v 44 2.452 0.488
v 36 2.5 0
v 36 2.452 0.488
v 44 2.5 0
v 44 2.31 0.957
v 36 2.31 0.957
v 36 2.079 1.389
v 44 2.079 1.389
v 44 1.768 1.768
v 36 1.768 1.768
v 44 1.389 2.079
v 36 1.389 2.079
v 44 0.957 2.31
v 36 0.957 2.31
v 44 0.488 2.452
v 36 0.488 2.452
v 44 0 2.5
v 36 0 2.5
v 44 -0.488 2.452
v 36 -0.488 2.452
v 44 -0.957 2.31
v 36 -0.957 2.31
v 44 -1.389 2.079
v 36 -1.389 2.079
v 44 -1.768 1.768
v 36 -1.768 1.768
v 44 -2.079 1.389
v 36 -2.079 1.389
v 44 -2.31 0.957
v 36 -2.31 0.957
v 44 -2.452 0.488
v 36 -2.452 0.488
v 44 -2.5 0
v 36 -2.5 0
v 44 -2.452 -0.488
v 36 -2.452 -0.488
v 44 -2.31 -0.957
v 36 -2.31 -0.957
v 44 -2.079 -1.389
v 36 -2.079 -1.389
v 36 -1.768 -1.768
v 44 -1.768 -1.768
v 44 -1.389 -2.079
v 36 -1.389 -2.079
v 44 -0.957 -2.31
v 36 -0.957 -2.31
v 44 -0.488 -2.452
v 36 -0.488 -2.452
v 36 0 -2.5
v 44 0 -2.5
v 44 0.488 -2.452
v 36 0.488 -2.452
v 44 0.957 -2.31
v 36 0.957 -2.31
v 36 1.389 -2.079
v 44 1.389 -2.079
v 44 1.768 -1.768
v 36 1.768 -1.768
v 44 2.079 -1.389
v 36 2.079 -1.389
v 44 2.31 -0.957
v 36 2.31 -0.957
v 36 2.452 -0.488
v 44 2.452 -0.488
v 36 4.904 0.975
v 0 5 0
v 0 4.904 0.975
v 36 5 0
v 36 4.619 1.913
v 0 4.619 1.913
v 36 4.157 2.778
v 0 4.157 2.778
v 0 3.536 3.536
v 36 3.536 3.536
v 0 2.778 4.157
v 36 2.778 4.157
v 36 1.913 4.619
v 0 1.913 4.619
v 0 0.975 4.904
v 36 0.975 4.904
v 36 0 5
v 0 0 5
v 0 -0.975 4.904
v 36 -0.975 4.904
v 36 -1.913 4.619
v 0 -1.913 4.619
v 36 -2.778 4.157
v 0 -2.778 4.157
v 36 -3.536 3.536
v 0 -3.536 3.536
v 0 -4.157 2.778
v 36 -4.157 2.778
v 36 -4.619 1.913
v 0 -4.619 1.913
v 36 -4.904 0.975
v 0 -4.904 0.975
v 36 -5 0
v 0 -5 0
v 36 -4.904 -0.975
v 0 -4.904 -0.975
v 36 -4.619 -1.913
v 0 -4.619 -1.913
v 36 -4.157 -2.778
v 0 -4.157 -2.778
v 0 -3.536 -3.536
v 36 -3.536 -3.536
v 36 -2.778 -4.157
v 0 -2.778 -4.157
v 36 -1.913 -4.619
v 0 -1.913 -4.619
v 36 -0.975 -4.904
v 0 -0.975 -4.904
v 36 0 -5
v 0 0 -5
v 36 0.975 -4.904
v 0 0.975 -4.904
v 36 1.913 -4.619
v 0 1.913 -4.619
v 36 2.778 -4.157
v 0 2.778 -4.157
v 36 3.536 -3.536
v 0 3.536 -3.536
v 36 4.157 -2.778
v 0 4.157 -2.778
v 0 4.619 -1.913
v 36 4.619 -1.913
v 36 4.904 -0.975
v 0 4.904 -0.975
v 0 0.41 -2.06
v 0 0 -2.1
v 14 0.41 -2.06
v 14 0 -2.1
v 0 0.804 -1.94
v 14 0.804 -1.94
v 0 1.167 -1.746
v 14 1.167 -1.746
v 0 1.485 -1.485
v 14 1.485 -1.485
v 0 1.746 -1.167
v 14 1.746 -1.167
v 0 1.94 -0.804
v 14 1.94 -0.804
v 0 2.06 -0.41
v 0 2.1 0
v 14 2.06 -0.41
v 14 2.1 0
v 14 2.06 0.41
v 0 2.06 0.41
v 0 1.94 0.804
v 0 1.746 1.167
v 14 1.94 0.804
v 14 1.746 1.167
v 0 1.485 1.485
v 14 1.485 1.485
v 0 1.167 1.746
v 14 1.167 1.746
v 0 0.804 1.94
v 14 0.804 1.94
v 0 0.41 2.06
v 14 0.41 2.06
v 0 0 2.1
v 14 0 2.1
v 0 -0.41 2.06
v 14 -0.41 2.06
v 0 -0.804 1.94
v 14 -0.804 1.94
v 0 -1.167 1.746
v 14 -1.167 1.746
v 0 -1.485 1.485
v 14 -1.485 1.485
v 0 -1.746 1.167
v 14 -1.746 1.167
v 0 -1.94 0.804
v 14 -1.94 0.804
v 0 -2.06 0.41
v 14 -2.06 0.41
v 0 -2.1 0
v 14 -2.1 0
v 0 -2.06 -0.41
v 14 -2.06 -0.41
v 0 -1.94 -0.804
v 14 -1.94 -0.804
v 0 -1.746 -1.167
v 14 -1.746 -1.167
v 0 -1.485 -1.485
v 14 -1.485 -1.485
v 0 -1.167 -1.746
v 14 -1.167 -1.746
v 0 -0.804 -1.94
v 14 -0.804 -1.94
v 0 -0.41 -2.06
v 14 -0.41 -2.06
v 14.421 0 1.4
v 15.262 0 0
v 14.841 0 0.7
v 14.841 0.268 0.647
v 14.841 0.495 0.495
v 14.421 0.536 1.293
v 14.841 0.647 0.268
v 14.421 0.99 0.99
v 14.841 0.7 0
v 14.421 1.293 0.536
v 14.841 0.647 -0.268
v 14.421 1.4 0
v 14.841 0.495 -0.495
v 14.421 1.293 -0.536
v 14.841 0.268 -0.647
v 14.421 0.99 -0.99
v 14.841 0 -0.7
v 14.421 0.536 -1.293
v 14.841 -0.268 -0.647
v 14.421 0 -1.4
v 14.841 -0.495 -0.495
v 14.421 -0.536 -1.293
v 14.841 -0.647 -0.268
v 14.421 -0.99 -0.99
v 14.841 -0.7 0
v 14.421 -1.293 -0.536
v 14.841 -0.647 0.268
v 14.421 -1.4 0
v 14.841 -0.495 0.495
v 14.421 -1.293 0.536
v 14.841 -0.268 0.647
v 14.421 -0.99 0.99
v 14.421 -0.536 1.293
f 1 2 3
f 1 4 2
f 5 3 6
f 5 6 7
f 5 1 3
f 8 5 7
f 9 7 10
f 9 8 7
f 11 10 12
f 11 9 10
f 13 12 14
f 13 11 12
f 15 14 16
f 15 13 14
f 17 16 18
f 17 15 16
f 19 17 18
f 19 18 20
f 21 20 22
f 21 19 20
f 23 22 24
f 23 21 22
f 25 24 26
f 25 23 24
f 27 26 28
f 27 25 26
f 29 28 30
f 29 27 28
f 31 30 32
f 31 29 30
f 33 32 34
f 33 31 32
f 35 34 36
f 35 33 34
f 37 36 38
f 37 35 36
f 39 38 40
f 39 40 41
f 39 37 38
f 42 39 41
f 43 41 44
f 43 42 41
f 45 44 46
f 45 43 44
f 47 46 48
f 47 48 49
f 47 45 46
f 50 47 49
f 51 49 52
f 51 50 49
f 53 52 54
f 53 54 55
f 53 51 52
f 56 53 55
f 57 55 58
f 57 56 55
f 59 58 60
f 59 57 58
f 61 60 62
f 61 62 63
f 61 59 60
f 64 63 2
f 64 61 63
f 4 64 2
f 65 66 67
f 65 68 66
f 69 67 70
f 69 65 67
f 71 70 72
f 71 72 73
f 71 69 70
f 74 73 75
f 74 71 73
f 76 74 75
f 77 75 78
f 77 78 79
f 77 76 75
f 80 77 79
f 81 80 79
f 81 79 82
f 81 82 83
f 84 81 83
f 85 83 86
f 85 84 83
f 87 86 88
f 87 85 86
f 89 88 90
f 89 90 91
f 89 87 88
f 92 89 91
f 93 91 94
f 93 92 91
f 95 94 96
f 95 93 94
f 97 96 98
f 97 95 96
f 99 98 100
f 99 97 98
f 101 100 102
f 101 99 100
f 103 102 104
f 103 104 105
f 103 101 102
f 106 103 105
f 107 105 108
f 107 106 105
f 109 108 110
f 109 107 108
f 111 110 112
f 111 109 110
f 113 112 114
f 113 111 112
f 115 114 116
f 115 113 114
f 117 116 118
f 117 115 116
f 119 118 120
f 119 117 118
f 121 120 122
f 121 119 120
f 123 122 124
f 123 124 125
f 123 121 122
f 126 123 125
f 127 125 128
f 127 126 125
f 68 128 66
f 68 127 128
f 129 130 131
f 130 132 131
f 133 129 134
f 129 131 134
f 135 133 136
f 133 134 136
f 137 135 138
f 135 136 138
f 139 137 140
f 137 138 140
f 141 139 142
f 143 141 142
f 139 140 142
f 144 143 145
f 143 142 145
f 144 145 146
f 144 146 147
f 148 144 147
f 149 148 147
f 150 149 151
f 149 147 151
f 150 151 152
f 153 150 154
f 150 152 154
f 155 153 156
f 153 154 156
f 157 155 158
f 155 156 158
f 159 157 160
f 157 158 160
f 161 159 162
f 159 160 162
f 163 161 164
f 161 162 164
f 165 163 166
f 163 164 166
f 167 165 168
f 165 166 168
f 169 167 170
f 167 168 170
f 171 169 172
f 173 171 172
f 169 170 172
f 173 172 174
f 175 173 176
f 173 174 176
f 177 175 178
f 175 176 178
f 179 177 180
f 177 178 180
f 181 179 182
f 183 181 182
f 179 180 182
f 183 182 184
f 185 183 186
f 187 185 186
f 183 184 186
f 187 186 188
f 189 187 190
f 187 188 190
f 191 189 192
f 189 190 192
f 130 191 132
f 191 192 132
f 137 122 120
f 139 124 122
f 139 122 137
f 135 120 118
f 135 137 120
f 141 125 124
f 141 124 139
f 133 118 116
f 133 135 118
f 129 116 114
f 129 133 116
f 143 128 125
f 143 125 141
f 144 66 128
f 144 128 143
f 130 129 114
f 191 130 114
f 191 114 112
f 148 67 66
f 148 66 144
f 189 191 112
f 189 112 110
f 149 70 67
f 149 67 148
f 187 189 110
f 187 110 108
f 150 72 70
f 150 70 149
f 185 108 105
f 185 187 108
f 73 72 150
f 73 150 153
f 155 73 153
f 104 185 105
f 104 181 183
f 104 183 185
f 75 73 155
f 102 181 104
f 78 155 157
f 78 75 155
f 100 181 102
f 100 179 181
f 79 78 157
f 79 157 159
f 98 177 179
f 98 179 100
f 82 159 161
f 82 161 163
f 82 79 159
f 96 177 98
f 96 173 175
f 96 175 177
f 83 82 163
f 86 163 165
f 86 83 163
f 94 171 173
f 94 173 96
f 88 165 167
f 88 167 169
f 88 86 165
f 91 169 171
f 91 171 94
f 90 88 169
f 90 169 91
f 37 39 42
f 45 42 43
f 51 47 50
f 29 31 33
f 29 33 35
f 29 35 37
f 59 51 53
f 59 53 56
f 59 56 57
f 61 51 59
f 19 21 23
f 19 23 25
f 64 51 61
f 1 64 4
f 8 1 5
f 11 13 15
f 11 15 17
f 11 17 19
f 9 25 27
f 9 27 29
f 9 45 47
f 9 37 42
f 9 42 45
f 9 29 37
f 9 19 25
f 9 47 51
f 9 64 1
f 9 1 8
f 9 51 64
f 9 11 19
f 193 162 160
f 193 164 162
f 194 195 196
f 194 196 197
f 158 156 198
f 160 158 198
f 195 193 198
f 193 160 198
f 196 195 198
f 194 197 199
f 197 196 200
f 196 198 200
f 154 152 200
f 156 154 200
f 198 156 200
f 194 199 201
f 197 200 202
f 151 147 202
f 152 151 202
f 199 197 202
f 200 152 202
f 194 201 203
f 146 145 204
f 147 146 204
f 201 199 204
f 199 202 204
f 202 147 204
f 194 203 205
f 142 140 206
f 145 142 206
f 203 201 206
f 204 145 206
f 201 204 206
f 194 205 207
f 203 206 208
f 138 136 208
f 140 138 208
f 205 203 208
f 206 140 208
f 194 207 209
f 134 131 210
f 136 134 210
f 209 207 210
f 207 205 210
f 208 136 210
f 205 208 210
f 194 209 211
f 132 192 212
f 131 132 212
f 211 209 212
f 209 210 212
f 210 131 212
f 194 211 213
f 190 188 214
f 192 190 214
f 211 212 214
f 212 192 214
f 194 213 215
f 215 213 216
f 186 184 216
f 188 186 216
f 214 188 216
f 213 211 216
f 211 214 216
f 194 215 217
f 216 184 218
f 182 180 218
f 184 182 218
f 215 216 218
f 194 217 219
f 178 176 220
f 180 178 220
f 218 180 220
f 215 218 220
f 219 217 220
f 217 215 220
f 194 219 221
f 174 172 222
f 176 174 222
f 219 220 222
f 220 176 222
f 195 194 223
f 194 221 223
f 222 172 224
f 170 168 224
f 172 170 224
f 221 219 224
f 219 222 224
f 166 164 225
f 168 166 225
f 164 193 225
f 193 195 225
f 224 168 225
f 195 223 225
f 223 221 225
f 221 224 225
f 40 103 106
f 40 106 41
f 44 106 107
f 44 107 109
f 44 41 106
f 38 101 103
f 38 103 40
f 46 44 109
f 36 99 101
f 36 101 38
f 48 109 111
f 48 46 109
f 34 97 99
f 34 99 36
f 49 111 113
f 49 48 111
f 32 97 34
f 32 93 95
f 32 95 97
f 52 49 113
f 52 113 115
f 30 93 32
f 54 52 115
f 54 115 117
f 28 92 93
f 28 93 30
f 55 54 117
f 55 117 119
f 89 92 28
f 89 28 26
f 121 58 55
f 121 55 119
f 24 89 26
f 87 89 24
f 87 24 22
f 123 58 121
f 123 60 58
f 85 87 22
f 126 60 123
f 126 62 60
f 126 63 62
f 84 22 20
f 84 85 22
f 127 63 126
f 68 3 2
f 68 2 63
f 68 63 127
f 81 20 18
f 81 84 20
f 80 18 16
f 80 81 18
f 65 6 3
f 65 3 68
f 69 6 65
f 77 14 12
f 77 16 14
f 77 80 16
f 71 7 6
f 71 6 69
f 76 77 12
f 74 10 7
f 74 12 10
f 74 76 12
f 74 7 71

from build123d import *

# Parameters (mm, degrees)
M5_GEWINDEBOHRUNG1_D     = 4.2
M5_GEWINDEBOHRUNG1_DEPTH = 14
M5_GEWINDEBOHRUNG1_TIP   = 1.2618073


with BuildPart() as part:
    # Skizze1 → Rotation1 (revolve)
    with BuildSketch(Plane.XY):
        Polygon((0, 0), (0, 5), (36, 5), (36, 2.5), (44, 2.5), (44, 0), align=None)
    revolve(axis=Axis((0, 0, 0), (1, 0, 0)))

    # M5 Gewindebohrung1
    with Locations(Plane.ZY):
        with Locations((0, 0)):
            Hole(M5_GEWINDEBOHRUNG1_D / 2, depth=M5_GEWINDEBOHRUNG1_DEPTH)
            with Locations((0, 0, -(M5_GEWINDEBOHRUNG1_DEPTH + M5_GEWINDEBOHRUNG1_TIP / 2))):  # 118° drill point
                Cone(0, M5_GEWINDEBOHRUNG1_D / 2, M5_GEWINDEBOHRUNG1_TIP, mode=Mode.SUBTRACT)


solid = part.part
